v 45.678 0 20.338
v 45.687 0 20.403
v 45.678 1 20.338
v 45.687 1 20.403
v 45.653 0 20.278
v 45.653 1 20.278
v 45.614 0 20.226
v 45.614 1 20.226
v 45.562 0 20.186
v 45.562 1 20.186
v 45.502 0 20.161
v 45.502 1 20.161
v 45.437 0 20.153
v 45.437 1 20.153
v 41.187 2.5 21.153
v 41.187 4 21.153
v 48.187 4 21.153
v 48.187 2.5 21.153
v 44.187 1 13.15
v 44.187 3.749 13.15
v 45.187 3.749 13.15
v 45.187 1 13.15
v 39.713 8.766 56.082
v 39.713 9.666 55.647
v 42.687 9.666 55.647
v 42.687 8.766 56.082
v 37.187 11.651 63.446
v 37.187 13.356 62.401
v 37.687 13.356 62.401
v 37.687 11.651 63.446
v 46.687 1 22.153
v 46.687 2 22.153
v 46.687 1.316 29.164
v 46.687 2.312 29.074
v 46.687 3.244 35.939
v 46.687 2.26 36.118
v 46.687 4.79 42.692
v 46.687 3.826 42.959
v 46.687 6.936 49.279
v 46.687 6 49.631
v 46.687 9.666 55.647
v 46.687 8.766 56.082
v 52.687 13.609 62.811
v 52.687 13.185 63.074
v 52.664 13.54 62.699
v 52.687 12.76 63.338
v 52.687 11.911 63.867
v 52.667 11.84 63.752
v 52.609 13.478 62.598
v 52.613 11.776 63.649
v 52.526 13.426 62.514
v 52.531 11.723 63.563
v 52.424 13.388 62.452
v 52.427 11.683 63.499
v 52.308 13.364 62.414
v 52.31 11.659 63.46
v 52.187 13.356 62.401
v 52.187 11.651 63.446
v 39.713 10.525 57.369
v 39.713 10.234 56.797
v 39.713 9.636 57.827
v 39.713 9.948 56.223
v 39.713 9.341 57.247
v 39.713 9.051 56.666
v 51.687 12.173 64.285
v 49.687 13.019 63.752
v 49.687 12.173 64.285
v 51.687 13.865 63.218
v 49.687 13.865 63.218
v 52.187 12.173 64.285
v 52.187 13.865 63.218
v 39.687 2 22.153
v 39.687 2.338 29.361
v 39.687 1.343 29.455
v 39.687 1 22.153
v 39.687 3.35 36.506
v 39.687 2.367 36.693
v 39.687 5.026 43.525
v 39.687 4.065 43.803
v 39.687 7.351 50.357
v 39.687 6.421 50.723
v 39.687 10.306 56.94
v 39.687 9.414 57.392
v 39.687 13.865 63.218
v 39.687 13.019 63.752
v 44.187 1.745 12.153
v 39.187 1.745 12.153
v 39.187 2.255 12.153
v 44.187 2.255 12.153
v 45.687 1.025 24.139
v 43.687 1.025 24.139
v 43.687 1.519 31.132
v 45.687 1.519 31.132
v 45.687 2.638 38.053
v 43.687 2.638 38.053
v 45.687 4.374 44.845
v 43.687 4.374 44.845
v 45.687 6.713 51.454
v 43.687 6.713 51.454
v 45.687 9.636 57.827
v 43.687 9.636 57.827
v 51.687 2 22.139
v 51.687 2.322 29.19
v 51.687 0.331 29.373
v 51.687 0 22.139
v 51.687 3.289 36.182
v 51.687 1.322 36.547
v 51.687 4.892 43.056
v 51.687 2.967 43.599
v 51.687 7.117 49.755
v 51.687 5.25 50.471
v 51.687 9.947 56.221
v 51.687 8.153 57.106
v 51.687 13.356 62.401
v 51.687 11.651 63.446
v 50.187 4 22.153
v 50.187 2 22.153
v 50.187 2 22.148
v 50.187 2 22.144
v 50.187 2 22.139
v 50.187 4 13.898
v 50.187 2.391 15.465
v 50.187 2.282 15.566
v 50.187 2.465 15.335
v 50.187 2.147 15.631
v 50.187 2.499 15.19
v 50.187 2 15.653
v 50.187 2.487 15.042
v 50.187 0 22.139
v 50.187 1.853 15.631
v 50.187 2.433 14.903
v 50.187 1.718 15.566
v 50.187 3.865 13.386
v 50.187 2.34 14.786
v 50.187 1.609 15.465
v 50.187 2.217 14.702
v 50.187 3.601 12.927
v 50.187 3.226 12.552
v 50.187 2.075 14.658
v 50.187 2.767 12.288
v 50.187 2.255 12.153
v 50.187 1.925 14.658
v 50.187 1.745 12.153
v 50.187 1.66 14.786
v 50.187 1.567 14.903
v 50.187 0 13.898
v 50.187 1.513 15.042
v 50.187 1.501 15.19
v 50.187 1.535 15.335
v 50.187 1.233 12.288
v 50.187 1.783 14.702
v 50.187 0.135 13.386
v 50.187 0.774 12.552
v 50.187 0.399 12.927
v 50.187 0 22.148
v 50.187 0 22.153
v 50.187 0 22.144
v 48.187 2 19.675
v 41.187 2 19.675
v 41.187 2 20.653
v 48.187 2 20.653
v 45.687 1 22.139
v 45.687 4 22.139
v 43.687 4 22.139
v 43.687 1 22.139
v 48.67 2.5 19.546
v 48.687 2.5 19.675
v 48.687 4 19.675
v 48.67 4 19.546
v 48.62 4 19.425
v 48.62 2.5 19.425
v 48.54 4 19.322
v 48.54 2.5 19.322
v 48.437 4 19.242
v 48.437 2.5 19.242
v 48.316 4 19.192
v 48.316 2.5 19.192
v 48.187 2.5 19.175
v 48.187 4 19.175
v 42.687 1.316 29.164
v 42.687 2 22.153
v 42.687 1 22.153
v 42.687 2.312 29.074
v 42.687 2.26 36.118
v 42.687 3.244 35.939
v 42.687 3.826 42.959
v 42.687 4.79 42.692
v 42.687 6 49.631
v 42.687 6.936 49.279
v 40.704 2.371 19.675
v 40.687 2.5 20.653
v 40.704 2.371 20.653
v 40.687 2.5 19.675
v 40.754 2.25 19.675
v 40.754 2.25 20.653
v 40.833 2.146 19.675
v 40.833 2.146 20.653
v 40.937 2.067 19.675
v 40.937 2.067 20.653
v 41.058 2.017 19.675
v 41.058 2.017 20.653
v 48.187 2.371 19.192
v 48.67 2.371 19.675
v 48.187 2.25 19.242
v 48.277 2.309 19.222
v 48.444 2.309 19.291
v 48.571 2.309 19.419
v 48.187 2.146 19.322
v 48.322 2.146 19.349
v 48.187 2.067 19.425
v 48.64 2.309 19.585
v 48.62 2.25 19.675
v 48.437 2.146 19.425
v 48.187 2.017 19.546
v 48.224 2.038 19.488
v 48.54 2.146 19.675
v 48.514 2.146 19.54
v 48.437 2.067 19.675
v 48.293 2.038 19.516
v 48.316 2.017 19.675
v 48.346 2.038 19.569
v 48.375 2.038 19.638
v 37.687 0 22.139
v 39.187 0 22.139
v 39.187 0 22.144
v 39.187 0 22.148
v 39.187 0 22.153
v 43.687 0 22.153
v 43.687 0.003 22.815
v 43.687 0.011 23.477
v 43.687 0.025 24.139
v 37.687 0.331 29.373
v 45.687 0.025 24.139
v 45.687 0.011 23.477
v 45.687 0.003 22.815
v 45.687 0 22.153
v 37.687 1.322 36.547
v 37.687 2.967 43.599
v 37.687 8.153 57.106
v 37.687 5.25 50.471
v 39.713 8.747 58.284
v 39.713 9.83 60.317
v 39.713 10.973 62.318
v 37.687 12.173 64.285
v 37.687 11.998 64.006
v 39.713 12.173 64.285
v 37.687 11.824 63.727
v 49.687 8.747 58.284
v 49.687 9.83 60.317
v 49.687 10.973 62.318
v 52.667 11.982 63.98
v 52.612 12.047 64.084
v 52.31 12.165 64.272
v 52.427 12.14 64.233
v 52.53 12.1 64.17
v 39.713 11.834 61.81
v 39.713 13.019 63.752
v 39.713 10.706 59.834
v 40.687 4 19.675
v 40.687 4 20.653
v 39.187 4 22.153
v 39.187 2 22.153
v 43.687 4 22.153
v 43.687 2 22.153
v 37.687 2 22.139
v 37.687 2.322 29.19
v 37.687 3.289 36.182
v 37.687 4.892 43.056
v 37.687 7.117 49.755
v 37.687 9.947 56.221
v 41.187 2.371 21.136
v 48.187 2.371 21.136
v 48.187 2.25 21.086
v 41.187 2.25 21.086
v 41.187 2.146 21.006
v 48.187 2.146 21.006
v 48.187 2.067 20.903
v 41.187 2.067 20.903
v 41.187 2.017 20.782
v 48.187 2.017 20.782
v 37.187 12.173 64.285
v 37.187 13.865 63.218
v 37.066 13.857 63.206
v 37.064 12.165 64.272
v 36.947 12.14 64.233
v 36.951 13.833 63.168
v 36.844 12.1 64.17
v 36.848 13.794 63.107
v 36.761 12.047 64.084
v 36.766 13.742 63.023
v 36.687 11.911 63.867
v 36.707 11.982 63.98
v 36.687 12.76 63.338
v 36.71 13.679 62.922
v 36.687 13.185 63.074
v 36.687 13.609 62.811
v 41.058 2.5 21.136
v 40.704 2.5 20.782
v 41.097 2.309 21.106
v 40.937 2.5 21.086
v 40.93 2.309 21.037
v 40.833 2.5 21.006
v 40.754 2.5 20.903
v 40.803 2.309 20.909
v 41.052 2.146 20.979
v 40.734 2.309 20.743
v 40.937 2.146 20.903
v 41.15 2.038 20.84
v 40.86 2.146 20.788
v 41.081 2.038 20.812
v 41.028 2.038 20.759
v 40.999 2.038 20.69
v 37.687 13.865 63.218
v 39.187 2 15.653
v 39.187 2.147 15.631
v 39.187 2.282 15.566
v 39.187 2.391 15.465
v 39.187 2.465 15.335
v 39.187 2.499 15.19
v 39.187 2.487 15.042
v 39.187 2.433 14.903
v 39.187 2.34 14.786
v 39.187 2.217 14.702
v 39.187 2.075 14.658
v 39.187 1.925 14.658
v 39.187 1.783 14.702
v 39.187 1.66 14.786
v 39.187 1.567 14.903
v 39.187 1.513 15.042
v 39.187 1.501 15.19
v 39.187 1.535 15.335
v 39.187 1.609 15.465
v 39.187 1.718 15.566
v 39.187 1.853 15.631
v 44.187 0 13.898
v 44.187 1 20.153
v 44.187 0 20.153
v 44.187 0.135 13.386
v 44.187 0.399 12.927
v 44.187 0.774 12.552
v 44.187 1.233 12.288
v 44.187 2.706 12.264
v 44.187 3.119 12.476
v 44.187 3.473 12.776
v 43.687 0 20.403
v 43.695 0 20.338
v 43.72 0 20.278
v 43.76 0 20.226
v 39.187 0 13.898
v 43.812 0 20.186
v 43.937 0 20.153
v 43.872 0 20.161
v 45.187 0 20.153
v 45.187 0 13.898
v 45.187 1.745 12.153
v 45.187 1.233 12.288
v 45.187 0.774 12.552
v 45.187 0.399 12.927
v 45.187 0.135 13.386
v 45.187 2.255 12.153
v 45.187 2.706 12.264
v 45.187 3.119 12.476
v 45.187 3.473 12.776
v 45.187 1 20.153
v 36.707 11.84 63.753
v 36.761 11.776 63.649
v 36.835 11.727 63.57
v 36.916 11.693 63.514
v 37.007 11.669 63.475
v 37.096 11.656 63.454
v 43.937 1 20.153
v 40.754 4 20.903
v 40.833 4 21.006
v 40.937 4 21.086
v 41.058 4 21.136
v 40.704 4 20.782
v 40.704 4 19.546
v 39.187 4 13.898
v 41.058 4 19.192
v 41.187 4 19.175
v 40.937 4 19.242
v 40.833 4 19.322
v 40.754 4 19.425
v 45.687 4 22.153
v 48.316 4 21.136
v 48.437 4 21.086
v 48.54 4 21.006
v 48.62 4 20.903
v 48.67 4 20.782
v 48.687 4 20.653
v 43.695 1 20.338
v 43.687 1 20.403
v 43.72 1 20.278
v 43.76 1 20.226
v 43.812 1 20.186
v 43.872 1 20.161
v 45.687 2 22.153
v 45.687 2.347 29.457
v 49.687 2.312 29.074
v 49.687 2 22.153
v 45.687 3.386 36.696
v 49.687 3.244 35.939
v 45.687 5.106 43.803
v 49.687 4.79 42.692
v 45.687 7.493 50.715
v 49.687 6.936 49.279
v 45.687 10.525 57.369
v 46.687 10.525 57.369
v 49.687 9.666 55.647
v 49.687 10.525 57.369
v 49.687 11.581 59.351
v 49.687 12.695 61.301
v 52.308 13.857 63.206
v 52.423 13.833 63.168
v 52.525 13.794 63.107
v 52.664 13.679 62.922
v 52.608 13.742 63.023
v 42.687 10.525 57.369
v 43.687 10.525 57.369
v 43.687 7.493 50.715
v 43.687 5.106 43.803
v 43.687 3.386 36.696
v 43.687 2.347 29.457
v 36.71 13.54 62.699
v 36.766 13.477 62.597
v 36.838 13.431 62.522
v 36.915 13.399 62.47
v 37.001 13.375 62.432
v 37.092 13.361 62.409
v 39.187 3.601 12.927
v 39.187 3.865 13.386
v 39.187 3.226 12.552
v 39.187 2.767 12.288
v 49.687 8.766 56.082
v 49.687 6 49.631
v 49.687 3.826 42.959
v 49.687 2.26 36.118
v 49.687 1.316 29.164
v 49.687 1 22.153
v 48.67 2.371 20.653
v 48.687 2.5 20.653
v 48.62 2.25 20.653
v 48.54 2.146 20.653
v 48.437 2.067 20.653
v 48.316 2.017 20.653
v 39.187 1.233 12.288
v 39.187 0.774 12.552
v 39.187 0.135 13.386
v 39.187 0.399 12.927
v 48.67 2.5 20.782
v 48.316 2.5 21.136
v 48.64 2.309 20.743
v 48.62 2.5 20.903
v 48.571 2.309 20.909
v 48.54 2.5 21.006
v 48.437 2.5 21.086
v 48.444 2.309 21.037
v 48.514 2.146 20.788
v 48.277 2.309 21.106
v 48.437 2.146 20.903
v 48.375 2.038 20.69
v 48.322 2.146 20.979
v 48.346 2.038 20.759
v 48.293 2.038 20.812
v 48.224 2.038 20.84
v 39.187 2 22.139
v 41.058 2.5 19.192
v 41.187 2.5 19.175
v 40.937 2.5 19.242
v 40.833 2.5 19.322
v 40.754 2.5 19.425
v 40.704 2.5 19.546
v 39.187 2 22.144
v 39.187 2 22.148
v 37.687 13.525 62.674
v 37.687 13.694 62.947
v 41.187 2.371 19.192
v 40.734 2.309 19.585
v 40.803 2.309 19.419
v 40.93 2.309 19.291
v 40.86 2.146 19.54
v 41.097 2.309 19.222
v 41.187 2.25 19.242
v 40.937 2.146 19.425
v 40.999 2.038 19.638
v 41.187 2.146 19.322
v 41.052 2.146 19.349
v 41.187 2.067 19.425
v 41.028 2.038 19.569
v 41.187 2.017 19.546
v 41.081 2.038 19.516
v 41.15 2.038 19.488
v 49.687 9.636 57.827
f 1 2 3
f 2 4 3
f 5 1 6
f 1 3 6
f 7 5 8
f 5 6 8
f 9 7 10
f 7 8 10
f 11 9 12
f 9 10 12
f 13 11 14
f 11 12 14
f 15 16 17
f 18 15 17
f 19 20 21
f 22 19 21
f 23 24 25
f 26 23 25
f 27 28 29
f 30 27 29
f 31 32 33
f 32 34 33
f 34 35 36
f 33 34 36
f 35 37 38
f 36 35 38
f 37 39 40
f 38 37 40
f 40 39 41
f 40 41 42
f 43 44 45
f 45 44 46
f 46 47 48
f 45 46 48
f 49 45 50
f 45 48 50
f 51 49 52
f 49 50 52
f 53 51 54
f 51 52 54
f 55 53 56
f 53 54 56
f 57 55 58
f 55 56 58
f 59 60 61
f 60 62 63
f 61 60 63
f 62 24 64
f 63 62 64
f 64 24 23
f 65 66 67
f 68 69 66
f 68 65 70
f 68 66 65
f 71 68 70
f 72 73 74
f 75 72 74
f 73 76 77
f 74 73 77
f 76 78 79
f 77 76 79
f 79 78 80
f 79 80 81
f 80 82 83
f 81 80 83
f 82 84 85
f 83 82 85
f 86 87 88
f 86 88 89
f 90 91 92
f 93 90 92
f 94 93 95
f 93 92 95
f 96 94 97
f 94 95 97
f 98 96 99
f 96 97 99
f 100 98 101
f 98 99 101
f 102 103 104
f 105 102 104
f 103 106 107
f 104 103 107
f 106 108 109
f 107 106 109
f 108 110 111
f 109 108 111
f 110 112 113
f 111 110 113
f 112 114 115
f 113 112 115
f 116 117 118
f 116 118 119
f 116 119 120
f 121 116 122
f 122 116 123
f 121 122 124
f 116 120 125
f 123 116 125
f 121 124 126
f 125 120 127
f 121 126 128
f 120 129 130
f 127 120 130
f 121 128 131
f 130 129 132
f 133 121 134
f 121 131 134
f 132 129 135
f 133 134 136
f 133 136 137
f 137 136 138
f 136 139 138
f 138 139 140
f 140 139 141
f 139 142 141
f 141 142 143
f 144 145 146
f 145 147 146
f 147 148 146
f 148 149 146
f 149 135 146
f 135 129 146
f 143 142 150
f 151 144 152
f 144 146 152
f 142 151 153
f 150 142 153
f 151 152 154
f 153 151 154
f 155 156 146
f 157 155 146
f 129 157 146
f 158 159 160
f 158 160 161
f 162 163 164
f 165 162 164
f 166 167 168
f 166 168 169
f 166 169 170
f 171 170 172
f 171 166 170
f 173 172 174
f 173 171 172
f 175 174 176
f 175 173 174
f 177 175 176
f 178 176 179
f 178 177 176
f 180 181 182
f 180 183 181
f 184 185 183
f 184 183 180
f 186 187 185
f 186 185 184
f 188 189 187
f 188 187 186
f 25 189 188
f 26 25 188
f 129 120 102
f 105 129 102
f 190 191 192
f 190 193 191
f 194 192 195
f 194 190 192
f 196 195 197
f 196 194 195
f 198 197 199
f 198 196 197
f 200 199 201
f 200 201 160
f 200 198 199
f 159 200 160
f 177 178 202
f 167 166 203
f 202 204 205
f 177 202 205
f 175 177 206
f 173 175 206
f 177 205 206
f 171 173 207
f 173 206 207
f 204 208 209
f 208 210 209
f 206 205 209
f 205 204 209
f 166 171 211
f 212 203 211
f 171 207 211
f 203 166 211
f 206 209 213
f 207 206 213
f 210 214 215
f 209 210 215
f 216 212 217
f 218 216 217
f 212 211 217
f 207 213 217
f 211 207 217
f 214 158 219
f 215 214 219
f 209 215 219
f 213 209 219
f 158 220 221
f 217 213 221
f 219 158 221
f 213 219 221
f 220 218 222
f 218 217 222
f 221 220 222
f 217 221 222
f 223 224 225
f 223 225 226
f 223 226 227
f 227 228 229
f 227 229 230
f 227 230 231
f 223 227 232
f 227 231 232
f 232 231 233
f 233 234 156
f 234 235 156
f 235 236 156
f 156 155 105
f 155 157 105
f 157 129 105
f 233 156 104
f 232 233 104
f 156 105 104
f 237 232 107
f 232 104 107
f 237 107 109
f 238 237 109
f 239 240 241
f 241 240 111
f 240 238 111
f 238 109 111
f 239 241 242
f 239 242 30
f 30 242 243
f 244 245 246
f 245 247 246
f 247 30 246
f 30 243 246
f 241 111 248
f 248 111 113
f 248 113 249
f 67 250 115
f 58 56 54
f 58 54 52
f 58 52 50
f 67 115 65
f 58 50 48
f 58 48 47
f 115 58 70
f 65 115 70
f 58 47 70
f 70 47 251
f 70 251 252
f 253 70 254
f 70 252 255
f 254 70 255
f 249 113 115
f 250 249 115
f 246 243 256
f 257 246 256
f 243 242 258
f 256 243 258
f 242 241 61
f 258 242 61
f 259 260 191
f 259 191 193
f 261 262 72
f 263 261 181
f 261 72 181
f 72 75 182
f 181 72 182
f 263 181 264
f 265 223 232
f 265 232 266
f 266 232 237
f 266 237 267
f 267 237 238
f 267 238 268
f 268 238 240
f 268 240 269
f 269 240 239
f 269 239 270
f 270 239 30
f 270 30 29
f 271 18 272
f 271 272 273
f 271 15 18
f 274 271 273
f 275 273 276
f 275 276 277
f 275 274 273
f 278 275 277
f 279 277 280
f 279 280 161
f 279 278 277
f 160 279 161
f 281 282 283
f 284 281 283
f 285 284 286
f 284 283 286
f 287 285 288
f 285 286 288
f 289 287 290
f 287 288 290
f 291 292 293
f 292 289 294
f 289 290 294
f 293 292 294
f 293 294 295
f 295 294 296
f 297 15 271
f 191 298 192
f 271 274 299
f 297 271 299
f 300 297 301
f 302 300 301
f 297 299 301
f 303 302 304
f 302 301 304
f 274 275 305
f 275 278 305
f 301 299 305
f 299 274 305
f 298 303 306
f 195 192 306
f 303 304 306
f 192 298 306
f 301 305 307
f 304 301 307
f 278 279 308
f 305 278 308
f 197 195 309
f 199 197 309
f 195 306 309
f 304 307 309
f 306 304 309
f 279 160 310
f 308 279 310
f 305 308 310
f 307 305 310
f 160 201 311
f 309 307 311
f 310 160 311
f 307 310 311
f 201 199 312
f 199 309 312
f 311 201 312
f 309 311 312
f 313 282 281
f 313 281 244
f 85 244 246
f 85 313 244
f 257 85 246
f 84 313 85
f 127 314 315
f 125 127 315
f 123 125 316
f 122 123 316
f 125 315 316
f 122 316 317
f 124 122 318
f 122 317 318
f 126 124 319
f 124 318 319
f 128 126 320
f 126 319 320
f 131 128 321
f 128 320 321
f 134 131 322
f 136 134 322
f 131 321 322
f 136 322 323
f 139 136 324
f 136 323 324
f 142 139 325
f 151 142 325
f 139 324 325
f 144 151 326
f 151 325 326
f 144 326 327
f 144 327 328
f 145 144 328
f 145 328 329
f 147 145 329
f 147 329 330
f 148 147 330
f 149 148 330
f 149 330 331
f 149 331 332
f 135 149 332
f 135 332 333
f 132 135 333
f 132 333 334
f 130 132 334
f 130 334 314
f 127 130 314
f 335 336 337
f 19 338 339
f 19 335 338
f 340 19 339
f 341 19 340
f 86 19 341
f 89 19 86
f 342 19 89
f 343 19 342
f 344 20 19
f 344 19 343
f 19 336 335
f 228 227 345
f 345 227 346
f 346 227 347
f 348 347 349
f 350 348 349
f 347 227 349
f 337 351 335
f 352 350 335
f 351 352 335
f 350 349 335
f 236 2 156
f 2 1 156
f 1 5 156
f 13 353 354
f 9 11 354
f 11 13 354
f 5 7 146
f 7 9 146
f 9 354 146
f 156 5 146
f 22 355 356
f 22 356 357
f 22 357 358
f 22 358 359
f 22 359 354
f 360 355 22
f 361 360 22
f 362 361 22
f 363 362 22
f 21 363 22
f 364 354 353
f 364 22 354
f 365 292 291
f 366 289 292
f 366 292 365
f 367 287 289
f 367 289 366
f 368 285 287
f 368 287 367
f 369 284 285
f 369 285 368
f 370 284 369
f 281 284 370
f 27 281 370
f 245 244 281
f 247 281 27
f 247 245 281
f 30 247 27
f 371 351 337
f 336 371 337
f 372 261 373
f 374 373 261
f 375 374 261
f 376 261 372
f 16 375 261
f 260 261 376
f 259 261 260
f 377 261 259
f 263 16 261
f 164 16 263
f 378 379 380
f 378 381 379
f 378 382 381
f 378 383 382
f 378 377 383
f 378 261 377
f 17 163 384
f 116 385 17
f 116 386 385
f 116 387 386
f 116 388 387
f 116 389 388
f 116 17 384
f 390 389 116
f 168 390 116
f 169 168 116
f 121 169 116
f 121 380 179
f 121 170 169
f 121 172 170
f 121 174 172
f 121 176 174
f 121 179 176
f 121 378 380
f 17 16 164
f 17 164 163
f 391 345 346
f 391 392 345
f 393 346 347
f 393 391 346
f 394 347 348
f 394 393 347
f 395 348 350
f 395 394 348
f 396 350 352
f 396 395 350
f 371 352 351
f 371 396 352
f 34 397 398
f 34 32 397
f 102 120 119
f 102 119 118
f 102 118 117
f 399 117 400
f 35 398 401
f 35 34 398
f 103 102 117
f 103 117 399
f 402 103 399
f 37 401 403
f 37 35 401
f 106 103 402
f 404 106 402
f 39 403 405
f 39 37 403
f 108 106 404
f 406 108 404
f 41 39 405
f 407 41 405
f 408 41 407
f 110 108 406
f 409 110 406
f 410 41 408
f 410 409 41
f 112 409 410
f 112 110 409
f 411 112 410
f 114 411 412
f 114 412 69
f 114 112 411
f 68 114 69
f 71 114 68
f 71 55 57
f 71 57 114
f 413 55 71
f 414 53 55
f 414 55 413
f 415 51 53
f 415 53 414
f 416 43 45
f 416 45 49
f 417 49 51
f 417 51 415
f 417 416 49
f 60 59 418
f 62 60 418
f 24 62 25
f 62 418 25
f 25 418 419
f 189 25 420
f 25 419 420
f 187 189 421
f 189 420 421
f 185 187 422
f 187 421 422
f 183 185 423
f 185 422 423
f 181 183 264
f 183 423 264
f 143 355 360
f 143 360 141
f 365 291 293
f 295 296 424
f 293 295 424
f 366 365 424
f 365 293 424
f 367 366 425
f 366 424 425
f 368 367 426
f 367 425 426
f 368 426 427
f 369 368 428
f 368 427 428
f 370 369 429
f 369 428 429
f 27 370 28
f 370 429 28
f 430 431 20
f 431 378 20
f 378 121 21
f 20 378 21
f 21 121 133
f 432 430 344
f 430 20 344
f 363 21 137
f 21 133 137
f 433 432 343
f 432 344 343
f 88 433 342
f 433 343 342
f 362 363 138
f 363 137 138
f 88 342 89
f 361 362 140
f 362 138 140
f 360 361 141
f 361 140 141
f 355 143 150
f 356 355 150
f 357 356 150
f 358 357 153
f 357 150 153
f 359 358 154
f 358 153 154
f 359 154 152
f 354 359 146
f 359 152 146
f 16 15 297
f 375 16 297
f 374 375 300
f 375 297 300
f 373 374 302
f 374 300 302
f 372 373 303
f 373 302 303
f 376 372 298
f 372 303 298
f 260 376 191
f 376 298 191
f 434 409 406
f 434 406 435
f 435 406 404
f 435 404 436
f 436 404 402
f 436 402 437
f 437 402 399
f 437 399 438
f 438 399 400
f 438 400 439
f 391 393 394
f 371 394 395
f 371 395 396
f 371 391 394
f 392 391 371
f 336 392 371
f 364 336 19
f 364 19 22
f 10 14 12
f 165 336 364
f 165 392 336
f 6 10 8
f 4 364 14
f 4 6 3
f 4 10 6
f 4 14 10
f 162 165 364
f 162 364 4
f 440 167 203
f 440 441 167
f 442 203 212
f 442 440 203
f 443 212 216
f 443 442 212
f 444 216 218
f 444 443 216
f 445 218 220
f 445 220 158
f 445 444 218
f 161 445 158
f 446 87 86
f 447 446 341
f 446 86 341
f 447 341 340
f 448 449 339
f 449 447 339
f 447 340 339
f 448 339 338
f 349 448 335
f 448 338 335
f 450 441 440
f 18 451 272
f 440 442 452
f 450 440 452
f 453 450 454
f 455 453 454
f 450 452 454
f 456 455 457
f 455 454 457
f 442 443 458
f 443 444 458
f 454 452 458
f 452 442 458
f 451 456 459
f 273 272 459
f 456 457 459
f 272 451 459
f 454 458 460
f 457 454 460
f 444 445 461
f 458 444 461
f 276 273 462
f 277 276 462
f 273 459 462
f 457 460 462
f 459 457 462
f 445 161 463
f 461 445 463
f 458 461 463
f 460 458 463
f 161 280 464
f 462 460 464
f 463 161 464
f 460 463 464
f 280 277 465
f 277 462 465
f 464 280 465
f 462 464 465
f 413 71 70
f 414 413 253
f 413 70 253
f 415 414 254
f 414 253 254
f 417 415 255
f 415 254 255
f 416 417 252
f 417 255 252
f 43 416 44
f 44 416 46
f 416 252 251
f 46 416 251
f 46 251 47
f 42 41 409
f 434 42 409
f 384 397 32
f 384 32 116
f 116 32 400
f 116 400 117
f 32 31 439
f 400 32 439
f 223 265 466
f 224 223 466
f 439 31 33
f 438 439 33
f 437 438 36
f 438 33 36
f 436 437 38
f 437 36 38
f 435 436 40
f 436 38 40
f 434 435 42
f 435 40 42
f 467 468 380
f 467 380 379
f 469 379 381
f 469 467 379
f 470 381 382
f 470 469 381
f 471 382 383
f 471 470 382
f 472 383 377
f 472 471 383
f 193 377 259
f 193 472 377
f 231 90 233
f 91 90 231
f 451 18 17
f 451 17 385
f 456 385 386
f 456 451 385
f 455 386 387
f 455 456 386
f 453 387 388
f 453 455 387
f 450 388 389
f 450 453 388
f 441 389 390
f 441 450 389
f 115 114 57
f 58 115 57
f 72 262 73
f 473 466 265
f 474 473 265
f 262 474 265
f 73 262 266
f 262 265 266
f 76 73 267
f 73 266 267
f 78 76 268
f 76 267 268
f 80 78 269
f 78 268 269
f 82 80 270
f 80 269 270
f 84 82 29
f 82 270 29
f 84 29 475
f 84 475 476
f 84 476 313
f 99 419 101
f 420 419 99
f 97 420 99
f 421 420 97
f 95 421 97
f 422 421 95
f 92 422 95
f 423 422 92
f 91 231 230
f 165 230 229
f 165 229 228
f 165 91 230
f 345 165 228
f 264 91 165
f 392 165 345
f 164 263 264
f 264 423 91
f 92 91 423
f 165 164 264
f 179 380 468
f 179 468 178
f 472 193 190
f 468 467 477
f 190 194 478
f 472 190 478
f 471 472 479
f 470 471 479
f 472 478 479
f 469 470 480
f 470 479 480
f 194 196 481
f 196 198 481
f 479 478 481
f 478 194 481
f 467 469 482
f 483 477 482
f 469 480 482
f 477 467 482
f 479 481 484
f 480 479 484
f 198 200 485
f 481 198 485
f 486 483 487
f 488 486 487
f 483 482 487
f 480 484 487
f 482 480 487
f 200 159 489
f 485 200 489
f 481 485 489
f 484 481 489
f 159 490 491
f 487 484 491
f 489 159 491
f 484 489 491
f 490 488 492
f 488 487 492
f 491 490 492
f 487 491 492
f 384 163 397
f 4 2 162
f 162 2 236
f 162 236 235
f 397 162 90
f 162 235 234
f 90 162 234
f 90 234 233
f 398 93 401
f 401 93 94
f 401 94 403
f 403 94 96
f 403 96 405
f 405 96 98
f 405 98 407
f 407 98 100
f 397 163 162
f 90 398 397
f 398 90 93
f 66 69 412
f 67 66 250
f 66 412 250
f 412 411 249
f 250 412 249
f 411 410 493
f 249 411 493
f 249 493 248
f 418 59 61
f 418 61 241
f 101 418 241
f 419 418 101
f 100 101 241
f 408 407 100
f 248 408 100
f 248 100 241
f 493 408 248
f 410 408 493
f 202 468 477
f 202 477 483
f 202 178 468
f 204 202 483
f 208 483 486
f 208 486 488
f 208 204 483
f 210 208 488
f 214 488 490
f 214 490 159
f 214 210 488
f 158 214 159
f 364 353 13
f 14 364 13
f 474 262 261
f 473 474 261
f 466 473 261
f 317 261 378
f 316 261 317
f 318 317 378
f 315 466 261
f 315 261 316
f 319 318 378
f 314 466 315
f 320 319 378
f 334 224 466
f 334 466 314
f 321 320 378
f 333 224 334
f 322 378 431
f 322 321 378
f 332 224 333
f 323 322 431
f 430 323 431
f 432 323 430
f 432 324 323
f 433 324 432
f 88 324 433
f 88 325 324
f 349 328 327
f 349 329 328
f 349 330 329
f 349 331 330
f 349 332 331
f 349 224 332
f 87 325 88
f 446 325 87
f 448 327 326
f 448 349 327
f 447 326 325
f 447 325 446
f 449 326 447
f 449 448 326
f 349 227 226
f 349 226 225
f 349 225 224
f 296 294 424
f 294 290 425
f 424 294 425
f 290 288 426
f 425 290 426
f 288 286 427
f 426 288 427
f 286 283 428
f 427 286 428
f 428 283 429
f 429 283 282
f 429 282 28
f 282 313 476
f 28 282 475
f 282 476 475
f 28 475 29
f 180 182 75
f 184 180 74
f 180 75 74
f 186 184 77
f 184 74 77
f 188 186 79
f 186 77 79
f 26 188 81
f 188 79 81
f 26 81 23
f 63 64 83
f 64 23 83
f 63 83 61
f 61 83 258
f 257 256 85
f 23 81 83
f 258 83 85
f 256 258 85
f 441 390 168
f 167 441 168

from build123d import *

# Parameters (mm, degrees)
CROQUIS1_W                  = 11
CROQUIS1_H                  = 10
SALIENTE_EXTRUIR1_DEPTH     = 4
CROQUIS2_R                  = 0.5
CORTAR_EXTRUIR1_DEPTH       = 12
CROQUIS3_W                  = 8
CROQUIS3_H                  = 1.977477592
CORTAR_EXTRUIR2_DEPTH       = 2
REDONDEO6_R                 = 0.5
REDONDEO8_R                 = 0.5
CORTAR_EXTRUIR3_DEPTH       = 20
CROQUIS5_W                  = 0.5
CROQUIS5_H                  = 1.744690478
CORTAR_EXTRUIR4_DEPTH       = 1
CORTAR_EXTRUIR6_DEPTH       = 12
CORTAR_EXTRUIR6_DEPTH_BACK  = 5
CROQUIS7_W                  = 1
CROQUIS7_H                  = 0.747728434
CROQUIS7_H_2                = 0.24923361
CROQUIS9_W                  = 2
CROQUIS9_H                  = 2
CORTAR_EXTRUIR7_DEPTH       = 1
REDONDEO10_R                = 0.25
CROQUIS11_W                 = 1.5
CROQUIS11_H                 = 1
CROQUIS11_W_2               = 0.5
CROQUIS11_W_3               = 1
REVOLUCI_N5_ANGLE           = 32.23
REVOLUCI_N5_OTHER_WAY_ANGLE = 0.01
CORTAR_EXTRUIR13_DEPTH      = 7
CORTAR_EXTRUIR13_DEPTH_BACK = 10
CROQUIS13_W                 = 2
CROQUIS13_H                 = 2
CORTAR_REVOLUCI_N1_ANGLE    = 5.013380707
CROQUIS15_W                 = 1
CROQUIS15_H                 = 2
REVOLUCI_N6_ANGLE           = 0.716197243
REDONDEO11_R                = 0.5
CROQUIS16_W                 = 2.973519437
CROQUIS16_H                 = 1
CROQUIS16_W_2               = 3
REVOLUCI_N7_ANGLE           = 1.432394488


with BuildPart() as part:
    # Croquis1 → Saliente-Extruir1 (new body)
    with BuildSketch(Plane(origin=(0, 0, 0), x_dir=(1, 0, 0), z_dir=(0, 1, 0))):
        with Locations((44.686928434, -17.152823879)):
            Rectangle(CROQUIS1_W, CROQUIS1_H)
    extrude(amount=SALIENTE_EXTRUIR1_DEPTH)

    # Croquis2 → Cortar-Extruir1 (cut)
    with BuildSketch(Plane.ZY.offset(-39.186928434)):
        with Locations((15.152823879, 2)):
            Circle(CROQUIS2_R)
    extrude(amount=-CORTAR_EXTRUIR1_DEPTH, mode=Mode.SUBTRACT)

    # Croquis3 → Cortar-Extruir2 (cut)
    with BuildSketch(Plane(origin=(0, 4, 0), x_dir=(1, 0, 0), z_dir=(0, 1, 0))):
        with Locations((44.686928434, -20.164085083)):
            Rectangle(CROQUIS3_W, CROQUIS3_H)
    extrude(amount=-CORTAR_EXTRUIR2_DEPTH, mode=Mode.SUBTRACT)

    # Redondeo6
    redondeo6_edges = [part.edges().sort_by_distance(p)[0] for p in [
        (48.686928434, 3, 19.175346287),
        (48.686928434, 3, 21.152823879),
        (40.686928434, 3, 21.152823879),
        (40.686928434, 3, 19.175346287),
    ]]
    fillet(redondeo6_edges, radius=REDONDEO6_R)

    # Redondeo8
    redondeo8_edges = [part.edges().sort_by_distance(p)[0] for p in [
        (44.686928434, 2, 19.175346287),
        (48.686928434, 2, 20.164085083),
        (40.686928434, 2, 20.164085083),
        (44.686928434, 2, 21.152823879),
        (40.833375043, 2, 19.321792897),
        (40.833375043, 2, 21.00637727),
        (48.540481825, 2, 21.00637727),
        (48.540481825, 2, 19.321792897),
    ]]
    fillet(redondeo8_edges, radius=REDONDEO8_R)

    # Croquis4 → Cortar-Extruir3 (cut)
    with BuildSketch(Plane(origin=(50.186928434, 0, 0), x_dir=(0, 0, -1), z_dir=(1, 0, 0))):
        with BuildLine():
            Line((-12.152823879, 4), (-13.897514357, 4))
            ThreePointArc((-13.897514357, 4), (-12.727134054, 3.425689825), (-12.152823879, 2.255309522))
            Line((-12.152823879, 2.255309522), (-12.152823879, 4))
        make_face()
        with BuildLine():
            ThreePointArc((-12.152823879, 1.744690478), (-12.727134054, 0.574310175), (-13.897514357, 0))
            Line((-13.897514357, 0), (-12.152823879, 0))
            Line((-12.152823879, 0), (-12.152823879, 1.744690478))
        make_face()
    extrude(amount=-CORTAR_EXTRUIR3_DEPTH, mode=Mode.SUBTRACT)

    # Croquis5 → Cortar-Extruir4 (cut)
    with BuildSketch(Plane.XZ):
        Polygon((44.686928434, 13.897514357), (44.686928434, 17.970046761), (44.686928434, 20.152823879), (44.186928434, 20.152823879), (44.186928434, 13.897514357), align=None)
        Polygon((44.686928434, 20.152823879), (44.686928434, 17.970046761), (44.686928434, 13.897514357), (45.186928434, 13.897514357), (45.186928434, 20.152823879), align=None)
        with Locations((44.436928434, 13.025169118)):
            Rectangle(CROQUIS5_W, CROQUIS5_H)
        with Locations((44.936928434, 13.025169118)):
            Rectangle(CROQUIS5_W, CROQUIS5_H)
    extrude(amount=-CORTAR_EXTRUIR4_DEPTH, mode=Mode.SUBTRACT)

    # Croquis7 → Cortar-Extruir6 (cut, two sides: drawn at the far end of the back side and taken through both)
    with BuildSketch(Plane.XZ.offset(-1).offset(-CORTAR_EXTRUIR6_DEPTH_BACK)):
        with Locations((44.686928434, 12.775921706)):
            Rectangle(CROQUIS7_W, CROQUIS7_H)
        with Locations((44.686928434, 12.277440684)):
            Rectangle(CROQUIS7_W, CROQUIS7_H_2)
    extrude(amount=CORTAR_EXTRUIR6_DEPTH + CORTAR_EXTRUIR6_DEPTH_BACK, mode=Mode.SUBTRACT)

    # Croquis9 → Cortar-Extruir7 (cut)
    with BuildSketch(Plane.XZ):
        with Locations((44.686928434, 21.152823879)):
            Rectangle(CROQUIS9_W, CROQUIS9_H)
    extrude(amount=-CORTAR_EXTRUIR7_DEPTH, mode=Mode.SUBTRACT)

    # Redondeo10
    redondeo10_edges = [part.edges().sort_by_distance(p)[0] for p in [
        (45.686928434, 0.5, 20.152823879),
        (43.686928434, 0.5, 20.152823879),
    ]]
    fillet(redondeo10_edges, radius=REDONDEO10_R)

    # Croquis11 → Revolución5 (revolve)
    with BuildSketch(Plane.XY.offset(22.152823879)):
        Polygon((39.186928434, 0), (43.686928434, 0), (43.686928434, 1), (42.686928434, 1), (39.686928434, 1), (39.186928434, 1), align=None)
        with Locations((38.436928434, 0.5)):
            Rectangle(CROQUIS11_W, CROQUIS11_H)
        with Locations((38.436928434, 1.5)):
            Rectangle(CROQUIS11_W, CROQUIS11_H)
        with Locations((39.436928434, 1.5)):
            Rectangle(CROQUIS11_W_2, CROQUIS11_H)
        with Locations((43.186928434, 1.5)):
            Rectangle(CROQUIS11_W_3, CROQUIS11_H)
        with Locations((44.186928434, 0.5)):
            Rectangle(CROQUIS11_W_3, CROQUIS11_H)
        with Locations((45.186928434, 0.5)):
            Rectangle(CROQUIS11_W_3, CROQUIS11_H)
        Polygon((45.686928434, 1), (45.686928434, 0), (50.186928434, 0), (50.186928434, 1), (49.686928434, 1), (46.686928434, 1), align=None)
        with Locations((50.936928434, 1.5)):
            Rectangle(CROQUIS11_W, CROQUIS11_H)
        with Locations((49.936928434, 1.5)):
            Rectangle(CROQUIS11_W_2, CROQUIS11_H)
        with Locations((50.936928434, 0.5)):
            Rectangle(CROQUIS11_W, CROQUIS11_H)
        with Locations((46.186928434, 1.5)):
            Rectangle(CROQUIS11_W_3, CROQUIS11_H)
    revolve(axis=Axis((44.686928434, 79, 22.152823879), (-1, 0, 0)), revolution_arc=REVOLUCI_N5_ANGLE)

    # Croquis11 → Revolución5 other way (revolve)
    with BuildSketch(Plane.XY.offset(22.152823879)):
        Polygon((39.186928434, 0), (43.686928434, 0), (43.686928434, 1), (42.686928434, 1), (39.686928434, 1), (39.186928434, 1), align=None)
        with Locations((38.436928434, 0.5)):
            Rectangle(CROQUIS11_W, CROQUIS11_H)
        with Locations((38.436928434, 1.5)):
            Rectangle(CROQUIS11_W, CROQUIS11_H)
        with Locations((39.436928434, 1.5)):
            Rectangle(CROQUIS11_W_2, CROQUIS11_H)
        with Locations((43.186928434, 1.5)):
            Rectangle(CROQUIS11_W_3, CROQUIS11_H)
        with Locations((44.186928434, 0.5)):
            Rectangle(CROQUIS11_W_3, CROQUIS11_H)
        with Locations((45.186928434, 0.5)):
            Rectangle(CROQUIS11_W_3, CROQUIS11_H)
        Polygon((45.686928434, 1), (45.686928434, 0), (50.186928434, 0), (50.186928434, 1), (49.686928434, 1), (46.686928434, 1), align=None)
        with Locations((50.936928434, 1.5)):
            Rectangle(CROQUIS11_W, CROQUIS11_H)
        with Locations((49.936928434, 1.5)):
            Rectangle(CROQUIS11_W_2, CROQUIS11_H)
        with Locations((50.936928434, 0.5)):
            Rectangle(CROQUIS11_W, CROQUIS11_H)
        with Locations((46.186928434, 1.5)):
            Rectangle(CROQUIS11_W_3, CROQUIS11_H)
    revolve(axis=Axis((44.686928434, 79, 22.152823879), (1, 0, 0)), revolution_arc=REVOLUCI_N5_OTHER_WAY_ANGLE)

    # Croquis13 → Cortar-Extruir13 (cut, two sides: drawn at the far end of the back side and taken through both)
    with BuildSketch(Plane(origin=(0, 1, 0), x_dir=(-1, 0, 0), z_dir=(0, -1, 0)).offset(-CORTAR_EXTRUIR13_DEPTH_BACK)):
        with Locations((-44.686928434, -23.139035778)):
            Rectangle(CROQUIS13_W, CROQUIS13_H)
    extrude(amount=CORTAR_EXTRUIR13_DEPTH + CORTAR_EXTRUIR13_DEPTH_BACK, mode=Mode.SUBTRACT)

    # Croquis14 → Cortar-Revolución1 (revolve, cut)
    with BuildSketch(Plane(origin=(0, 32.464000878, 51.49214672), x_dir=(1, 0, 0), z_dir=(0, 0.5333192687106637, 0.8459140367802884))):
        Polygon((39.713408997, -22.987318925), (39.713408997, -23.987318925), (44.700168716, -23.987318925), (44.700168716, -22.987318925), (43.686928434, -22.987318925), (43.686928434, -21.987318925), (42.686928434, -21.987318925), (42.686928434, -22.987318925), align=None)
        Polygon((44.700168716, -22.987318925), (44.700168716, -23.987318925), (49.686928434, -23.987318925), (49.686928434, -22.987318925), (46.686928434, -22.987318925), (46.686928434, -21.987318925), (45.686928434, -21.987318925), (45.686928434, -22.987318925), align=None)
    revolve(axis=Axis((44.700168716, 79, 22.152823879), (1, 0, 0)), revolution_arc=CORTAR_REVOLUCI_N1_ANGLE, mode=Mode.SUBTRACT)

    # Croquis15 → Revolución6 (revolve)
    with BuildSketch(Plane(origin=(0, 32.464000878, 51.49214672), x_dir=(1, 0, 0), z_dir=(0, 0.5333192687106637, 0.8459140367802884))):
        with Locations((37.186928434, -22.987318925)):
            Rectangle(CROQUIS15_W, CROQUIS15_H)
        with Locations((52.186928434, -22.987318925)):
            Rectangle(CROQUIS15_W, CROQUIS15_H)
    revolve(axis=Axis((39.713408997, 79, 22.152823879), (1, 0, 0)), revolution_arc=REVOLUCI_N6_ANGLE)

    # Redondeo11
    # the kernel refuses this fillet: 0.5 mm, written as the material it takes off along each edge
    with BuildSketch(Plane(origin=(52.686928434, 10.585730005, 64.099816155), x_dir=(0, 0.522703953599643, 0.8525142678520415), z_dir=(0, 0.8525142678520415, -0.5227039535996431)), Plane(origin=(52.686928434, 11.115398548, 64.951695193), x_dir=(-1, 0, 0), z_dir=(0, 0.8459140367802884, -0.5333192687106637)), Plane(origin=(36.686928434, 14.42204421, 61.747648364), x_dir=(0, 0.522703953599643, 0.8525142678520415), z_dir=(0, -0.8525142678520415, 0.5227039535996431)), Plane(origin=(36.686928434, 14.922011714, 62.551758484), x_dir=(1, 0, 0), z_dir=(0, -0.8459140367802884, 0.5333192687106637))) as redondeo11_piece_1:
        with BuildLine():
            CenterArc((REDONDEO11_R, -REDONDEO11_R), REDONDEO11_R, 90, 90)
            Line((0, -REDONDEO11_R), (0, 0))
            Line((0, 0), (REDONDEO11_R, 0))
        make_face()
    extrude(amount=4.5, mode=Mode.SUBTRACT)

    # Croquis16 → Revolución7 (revolve)
    with BuildSketch(Plane(origin=(0, 25.534756625, 49.649833864), x_dir=(1, 0, 0), z_dir=(0, 0.4573558931685637, 0.8892837494208389))):
        with Locations((41.200168715, -17.378308347)):
            Rectangle(CROQUIS16_W, CROQUIS16_H)
        with Locations((48.186928434, -17.378308347)):
            Rectangle(CROQUIS16_W_2, CROQUIS16_H)
    revolve(axis=Axis((44.700168716, 79, 22.152823879), (1, 0, 0)), revolution_arc=REVOLUCI_N7_ANGLE)


solid = part.part
